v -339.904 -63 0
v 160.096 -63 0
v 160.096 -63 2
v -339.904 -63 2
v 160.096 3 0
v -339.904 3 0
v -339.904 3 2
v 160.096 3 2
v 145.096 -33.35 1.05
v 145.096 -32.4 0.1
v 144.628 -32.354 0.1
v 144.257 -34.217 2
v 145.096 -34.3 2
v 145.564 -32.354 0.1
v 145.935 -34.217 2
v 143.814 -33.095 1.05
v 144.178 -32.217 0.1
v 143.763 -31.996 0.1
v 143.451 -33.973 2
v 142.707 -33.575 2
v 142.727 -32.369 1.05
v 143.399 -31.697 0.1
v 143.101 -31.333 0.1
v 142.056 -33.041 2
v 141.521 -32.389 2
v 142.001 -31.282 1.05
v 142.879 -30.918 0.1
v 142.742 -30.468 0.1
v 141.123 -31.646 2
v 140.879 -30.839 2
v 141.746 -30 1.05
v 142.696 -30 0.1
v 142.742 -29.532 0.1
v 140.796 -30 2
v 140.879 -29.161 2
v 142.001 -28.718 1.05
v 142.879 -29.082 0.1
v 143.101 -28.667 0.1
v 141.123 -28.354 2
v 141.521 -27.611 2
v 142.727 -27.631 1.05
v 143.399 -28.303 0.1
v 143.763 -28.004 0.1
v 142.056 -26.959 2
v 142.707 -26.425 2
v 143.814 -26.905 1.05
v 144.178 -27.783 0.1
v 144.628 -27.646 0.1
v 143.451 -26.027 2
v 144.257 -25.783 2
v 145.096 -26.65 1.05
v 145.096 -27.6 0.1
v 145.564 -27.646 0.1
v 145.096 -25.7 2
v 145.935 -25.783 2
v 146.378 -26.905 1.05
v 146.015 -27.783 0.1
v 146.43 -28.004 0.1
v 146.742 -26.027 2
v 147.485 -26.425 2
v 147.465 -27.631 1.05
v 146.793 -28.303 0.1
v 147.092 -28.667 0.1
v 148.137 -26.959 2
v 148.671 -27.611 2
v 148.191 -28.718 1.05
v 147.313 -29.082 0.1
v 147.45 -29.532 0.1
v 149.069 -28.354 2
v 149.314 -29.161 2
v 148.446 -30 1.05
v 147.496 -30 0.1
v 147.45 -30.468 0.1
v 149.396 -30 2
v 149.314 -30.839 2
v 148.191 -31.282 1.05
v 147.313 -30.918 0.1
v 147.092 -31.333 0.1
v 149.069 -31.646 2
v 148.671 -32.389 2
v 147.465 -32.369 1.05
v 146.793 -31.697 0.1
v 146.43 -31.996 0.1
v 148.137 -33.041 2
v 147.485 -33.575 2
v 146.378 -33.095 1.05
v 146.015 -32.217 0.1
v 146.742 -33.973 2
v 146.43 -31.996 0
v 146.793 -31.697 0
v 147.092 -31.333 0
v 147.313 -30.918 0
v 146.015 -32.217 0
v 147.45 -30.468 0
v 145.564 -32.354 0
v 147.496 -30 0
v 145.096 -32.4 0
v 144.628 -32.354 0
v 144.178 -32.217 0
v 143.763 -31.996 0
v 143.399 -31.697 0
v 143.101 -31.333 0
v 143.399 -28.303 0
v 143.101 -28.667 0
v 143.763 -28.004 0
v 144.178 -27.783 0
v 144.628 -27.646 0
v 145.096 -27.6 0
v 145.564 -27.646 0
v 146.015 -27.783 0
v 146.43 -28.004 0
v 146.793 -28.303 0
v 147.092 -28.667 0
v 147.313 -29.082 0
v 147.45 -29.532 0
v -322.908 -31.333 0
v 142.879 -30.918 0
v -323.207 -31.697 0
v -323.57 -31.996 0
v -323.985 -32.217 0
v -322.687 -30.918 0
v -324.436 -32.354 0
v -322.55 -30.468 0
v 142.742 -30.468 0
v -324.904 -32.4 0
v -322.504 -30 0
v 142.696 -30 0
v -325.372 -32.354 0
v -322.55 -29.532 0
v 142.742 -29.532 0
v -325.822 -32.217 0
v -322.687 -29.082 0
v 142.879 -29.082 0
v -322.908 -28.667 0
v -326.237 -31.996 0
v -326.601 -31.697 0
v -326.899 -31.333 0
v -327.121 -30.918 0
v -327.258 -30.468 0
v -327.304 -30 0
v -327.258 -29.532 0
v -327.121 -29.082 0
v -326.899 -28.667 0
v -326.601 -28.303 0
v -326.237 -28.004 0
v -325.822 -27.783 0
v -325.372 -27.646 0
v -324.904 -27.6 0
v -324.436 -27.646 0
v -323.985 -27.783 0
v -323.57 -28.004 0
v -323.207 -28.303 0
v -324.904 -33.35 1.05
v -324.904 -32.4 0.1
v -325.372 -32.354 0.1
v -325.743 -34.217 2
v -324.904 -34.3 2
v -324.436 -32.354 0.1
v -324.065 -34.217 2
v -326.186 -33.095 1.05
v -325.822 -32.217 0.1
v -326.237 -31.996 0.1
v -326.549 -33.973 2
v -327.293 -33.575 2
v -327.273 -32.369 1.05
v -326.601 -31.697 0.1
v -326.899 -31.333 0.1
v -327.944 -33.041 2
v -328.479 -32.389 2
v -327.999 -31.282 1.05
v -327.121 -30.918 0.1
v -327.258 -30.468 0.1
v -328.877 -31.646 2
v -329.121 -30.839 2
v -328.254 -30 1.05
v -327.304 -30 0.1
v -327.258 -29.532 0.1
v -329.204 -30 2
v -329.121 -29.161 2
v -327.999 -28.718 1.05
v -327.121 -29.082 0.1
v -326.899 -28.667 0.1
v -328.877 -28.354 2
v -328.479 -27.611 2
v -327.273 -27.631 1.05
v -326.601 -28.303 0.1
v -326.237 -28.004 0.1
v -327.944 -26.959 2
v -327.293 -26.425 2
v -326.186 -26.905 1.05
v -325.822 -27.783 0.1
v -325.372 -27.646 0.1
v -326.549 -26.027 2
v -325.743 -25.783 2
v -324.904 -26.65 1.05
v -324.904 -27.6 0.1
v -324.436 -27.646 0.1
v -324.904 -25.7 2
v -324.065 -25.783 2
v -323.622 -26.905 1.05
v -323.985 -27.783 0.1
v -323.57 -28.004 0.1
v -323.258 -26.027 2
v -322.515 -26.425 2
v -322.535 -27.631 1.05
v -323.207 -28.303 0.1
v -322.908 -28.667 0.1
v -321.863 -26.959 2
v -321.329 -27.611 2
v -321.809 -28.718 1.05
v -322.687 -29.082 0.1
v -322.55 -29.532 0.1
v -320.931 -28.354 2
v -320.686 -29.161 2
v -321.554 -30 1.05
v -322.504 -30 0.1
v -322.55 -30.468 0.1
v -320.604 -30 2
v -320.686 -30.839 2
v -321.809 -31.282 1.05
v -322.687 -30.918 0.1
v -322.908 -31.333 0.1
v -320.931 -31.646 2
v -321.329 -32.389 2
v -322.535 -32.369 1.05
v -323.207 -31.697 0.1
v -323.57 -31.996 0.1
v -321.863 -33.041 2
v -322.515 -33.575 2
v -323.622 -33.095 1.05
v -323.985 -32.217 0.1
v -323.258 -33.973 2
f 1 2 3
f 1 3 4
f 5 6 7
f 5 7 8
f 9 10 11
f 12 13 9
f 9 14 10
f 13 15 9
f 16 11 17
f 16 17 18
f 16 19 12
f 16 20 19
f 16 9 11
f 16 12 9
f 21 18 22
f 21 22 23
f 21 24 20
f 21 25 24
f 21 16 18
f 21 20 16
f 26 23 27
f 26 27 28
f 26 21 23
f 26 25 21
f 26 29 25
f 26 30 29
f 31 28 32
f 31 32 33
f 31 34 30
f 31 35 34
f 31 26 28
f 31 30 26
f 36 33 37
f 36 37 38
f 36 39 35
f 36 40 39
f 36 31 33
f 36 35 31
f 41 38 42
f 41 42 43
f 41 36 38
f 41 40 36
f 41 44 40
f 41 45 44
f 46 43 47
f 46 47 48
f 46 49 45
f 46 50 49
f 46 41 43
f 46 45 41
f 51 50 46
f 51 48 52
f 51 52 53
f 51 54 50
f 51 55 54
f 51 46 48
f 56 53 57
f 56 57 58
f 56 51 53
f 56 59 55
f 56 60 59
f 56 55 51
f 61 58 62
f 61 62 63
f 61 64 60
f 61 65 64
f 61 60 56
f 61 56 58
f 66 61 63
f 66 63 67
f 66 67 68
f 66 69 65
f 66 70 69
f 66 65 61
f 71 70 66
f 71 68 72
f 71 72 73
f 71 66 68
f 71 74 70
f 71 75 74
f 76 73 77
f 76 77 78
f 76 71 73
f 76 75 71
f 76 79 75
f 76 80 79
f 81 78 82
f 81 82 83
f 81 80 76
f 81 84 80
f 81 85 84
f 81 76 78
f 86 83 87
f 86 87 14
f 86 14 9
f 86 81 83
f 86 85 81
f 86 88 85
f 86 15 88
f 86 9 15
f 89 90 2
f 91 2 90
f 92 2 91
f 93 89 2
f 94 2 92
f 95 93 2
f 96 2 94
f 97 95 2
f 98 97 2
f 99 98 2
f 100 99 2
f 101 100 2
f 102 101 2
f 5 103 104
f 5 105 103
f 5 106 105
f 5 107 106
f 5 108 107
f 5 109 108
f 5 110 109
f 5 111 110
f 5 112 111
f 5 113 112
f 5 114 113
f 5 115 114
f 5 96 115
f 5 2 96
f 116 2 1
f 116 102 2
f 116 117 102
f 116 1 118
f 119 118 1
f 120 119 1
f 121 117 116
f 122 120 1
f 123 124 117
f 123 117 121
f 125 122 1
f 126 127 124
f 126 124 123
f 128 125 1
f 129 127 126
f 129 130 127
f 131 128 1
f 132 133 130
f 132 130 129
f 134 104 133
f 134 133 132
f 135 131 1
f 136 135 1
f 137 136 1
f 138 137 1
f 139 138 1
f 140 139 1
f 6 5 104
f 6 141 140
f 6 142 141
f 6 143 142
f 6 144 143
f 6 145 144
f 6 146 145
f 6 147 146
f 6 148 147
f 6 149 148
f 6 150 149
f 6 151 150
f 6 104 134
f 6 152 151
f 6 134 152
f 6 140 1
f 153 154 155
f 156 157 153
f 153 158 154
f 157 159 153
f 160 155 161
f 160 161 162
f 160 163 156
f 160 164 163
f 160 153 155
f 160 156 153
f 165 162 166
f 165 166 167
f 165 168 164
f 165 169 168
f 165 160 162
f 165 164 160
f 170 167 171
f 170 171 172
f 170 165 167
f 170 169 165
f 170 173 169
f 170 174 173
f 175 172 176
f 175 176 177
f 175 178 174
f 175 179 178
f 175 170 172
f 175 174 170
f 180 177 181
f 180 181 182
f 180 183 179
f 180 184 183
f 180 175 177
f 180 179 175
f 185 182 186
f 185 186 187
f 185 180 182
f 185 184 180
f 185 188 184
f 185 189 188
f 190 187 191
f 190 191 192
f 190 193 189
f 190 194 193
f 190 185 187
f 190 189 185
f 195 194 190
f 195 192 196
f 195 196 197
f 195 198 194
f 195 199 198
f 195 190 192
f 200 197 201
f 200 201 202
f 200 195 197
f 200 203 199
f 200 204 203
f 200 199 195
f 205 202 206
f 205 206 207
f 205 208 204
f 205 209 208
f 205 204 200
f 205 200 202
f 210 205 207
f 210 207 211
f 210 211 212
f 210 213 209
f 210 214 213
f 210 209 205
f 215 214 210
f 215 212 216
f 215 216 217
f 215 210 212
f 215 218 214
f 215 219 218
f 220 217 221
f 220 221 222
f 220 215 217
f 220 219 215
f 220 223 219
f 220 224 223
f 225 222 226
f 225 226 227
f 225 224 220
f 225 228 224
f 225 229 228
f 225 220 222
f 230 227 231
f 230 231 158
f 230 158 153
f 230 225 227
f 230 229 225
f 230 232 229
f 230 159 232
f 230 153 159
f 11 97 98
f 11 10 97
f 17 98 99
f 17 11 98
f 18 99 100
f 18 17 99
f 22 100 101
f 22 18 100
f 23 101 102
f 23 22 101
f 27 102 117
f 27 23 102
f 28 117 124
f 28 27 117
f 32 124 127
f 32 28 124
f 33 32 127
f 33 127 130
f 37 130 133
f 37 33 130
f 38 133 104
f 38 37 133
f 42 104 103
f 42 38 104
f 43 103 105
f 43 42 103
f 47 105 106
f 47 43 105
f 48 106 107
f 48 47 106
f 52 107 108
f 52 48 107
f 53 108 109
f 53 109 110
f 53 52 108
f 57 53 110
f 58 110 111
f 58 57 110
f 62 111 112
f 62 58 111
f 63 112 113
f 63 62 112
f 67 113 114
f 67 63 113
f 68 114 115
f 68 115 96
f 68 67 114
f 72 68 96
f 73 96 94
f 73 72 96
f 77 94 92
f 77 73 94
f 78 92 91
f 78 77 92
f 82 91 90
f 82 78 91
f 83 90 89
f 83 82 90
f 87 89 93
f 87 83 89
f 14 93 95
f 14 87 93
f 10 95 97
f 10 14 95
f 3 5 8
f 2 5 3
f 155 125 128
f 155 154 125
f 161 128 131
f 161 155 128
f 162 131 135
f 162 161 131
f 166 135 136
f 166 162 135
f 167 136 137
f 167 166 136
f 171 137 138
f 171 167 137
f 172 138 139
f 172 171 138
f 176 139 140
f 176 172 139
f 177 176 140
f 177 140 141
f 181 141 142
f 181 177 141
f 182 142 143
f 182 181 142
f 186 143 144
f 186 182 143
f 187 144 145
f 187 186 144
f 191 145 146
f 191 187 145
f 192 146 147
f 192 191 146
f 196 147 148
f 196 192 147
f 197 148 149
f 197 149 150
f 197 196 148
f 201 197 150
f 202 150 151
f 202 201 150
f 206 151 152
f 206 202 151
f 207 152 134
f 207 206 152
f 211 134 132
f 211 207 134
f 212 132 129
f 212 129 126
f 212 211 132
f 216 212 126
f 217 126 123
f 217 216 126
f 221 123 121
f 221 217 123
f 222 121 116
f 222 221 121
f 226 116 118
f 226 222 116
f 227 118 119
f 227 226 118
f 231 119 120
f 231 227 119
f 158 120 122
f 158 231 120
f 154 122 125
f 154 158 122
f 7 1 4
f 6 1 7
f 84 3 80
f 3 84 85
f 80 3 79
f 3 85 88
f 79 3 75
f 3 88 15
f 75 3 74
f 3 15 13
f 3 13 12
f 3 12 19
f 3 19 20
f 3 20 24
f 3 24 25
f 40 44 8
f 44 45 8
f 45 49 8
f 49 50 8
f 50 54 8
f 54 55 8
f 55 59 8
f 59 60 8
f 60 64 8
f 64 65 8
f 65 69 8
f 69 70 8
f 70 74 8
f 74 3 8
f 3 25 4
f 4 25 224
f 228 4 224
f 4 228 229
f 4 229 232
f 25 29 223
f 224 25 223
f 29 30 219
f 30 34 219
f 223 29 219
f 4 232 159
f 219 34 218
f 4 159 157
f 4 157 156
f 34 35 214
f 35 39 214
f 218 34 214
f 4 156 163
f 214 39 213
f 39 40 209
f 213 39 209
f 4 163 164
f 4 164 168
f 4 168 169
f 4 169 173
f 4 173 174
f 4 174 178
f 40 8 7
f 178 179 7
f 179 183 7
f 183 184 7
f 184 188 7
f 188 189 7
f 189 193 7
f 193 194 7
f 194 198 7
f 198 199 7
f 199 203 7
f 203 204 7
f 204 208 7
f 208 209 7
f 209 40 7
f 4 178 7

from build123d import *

# Parameters (mm, degrees)
AUFSATZ_LINEAR_AUSTRAGEN1_DEPTH             = 2
FORMSENKUNG_F_R_M4_SENKSCHRAUBE_MIT_2_COUNT = 2
FORMSENKUNG_F_R_M4_SENKSCHRAUBE_MIT_2_PITCH = 470
SKIZZE5_W                                   = 500
SKIZZE5_H                                   = 8
SCHLITZ_OBEN_DEPTH                          = 10


with BuildPart() as part:
    # Skizze1 → Aufsatz-Linear austragen1 (new body)
    with BuildSketch(Plane.XY):
        Polygon((-339.903846154, 3), (160.096153846, 3), (160.096153846, -63), (130.095509739, -63), (130.095509739, -71), (-309.903846154, -71), (-309.903846154, -63), (-339.903846154, -63), align=None)
    extrude(amount=AUFSATZ_LINEAR_AUSTRAGEN1_DEPTH)

    # Skizze3 → Formsenkung für M4 Senkschraube mit Innensechskant1 (revolve, cut)
    with BuildSketch(Plane(origin=(145.096153846, -30, 2), x_dir=(0, -1, 0), z_dir=(1, 0, 0))):
        Polygon((0, 0), (0, 2), (2.4, 2), (2.4, 1.9), (4.3, 0), align=None)
    formsenkung_f_r_m4_senkschraube_mit_inne = revolve(axis=Axis((145.096153846, -30, 8.35), (0, 0, -1)), mode=Mode.SUBTRACT)

    # Formsenkung f_r M4 Senkschraube mit  2: Formsenkung für M4 Senkschraube mit Innensechskant1 ×2
    with Locations(*[(-i * FORMSENKUNG_F_R_M4_SENKSCHRAUBE_MIT_2_PITCH, 0, 0) for i in range(1, FORMSENKUNG_F_R_M4_SENKSCHRAUBE_MIT_2_COUNT)]):
        add(formsenkung_f_r_m4_senkschraube_mit_inne, mode=Mode.SUBTRACT)

    # Skizze5 → Schlitz Oben (cut)
    with BuildSketch(Plane(origin=(0, 0, 0), x_dir=(-1, 0, 0), z_dir=(0, 0, -1))):
        with Locations((89.903846154, -67)):
            Rectangle(SKIZZE5_W, SKIZZE5_H)
    extrude(amount=-SCHLITZ_OBEN_DEPTH, mode=Mode.SUBTRACT)


solid = part.part
